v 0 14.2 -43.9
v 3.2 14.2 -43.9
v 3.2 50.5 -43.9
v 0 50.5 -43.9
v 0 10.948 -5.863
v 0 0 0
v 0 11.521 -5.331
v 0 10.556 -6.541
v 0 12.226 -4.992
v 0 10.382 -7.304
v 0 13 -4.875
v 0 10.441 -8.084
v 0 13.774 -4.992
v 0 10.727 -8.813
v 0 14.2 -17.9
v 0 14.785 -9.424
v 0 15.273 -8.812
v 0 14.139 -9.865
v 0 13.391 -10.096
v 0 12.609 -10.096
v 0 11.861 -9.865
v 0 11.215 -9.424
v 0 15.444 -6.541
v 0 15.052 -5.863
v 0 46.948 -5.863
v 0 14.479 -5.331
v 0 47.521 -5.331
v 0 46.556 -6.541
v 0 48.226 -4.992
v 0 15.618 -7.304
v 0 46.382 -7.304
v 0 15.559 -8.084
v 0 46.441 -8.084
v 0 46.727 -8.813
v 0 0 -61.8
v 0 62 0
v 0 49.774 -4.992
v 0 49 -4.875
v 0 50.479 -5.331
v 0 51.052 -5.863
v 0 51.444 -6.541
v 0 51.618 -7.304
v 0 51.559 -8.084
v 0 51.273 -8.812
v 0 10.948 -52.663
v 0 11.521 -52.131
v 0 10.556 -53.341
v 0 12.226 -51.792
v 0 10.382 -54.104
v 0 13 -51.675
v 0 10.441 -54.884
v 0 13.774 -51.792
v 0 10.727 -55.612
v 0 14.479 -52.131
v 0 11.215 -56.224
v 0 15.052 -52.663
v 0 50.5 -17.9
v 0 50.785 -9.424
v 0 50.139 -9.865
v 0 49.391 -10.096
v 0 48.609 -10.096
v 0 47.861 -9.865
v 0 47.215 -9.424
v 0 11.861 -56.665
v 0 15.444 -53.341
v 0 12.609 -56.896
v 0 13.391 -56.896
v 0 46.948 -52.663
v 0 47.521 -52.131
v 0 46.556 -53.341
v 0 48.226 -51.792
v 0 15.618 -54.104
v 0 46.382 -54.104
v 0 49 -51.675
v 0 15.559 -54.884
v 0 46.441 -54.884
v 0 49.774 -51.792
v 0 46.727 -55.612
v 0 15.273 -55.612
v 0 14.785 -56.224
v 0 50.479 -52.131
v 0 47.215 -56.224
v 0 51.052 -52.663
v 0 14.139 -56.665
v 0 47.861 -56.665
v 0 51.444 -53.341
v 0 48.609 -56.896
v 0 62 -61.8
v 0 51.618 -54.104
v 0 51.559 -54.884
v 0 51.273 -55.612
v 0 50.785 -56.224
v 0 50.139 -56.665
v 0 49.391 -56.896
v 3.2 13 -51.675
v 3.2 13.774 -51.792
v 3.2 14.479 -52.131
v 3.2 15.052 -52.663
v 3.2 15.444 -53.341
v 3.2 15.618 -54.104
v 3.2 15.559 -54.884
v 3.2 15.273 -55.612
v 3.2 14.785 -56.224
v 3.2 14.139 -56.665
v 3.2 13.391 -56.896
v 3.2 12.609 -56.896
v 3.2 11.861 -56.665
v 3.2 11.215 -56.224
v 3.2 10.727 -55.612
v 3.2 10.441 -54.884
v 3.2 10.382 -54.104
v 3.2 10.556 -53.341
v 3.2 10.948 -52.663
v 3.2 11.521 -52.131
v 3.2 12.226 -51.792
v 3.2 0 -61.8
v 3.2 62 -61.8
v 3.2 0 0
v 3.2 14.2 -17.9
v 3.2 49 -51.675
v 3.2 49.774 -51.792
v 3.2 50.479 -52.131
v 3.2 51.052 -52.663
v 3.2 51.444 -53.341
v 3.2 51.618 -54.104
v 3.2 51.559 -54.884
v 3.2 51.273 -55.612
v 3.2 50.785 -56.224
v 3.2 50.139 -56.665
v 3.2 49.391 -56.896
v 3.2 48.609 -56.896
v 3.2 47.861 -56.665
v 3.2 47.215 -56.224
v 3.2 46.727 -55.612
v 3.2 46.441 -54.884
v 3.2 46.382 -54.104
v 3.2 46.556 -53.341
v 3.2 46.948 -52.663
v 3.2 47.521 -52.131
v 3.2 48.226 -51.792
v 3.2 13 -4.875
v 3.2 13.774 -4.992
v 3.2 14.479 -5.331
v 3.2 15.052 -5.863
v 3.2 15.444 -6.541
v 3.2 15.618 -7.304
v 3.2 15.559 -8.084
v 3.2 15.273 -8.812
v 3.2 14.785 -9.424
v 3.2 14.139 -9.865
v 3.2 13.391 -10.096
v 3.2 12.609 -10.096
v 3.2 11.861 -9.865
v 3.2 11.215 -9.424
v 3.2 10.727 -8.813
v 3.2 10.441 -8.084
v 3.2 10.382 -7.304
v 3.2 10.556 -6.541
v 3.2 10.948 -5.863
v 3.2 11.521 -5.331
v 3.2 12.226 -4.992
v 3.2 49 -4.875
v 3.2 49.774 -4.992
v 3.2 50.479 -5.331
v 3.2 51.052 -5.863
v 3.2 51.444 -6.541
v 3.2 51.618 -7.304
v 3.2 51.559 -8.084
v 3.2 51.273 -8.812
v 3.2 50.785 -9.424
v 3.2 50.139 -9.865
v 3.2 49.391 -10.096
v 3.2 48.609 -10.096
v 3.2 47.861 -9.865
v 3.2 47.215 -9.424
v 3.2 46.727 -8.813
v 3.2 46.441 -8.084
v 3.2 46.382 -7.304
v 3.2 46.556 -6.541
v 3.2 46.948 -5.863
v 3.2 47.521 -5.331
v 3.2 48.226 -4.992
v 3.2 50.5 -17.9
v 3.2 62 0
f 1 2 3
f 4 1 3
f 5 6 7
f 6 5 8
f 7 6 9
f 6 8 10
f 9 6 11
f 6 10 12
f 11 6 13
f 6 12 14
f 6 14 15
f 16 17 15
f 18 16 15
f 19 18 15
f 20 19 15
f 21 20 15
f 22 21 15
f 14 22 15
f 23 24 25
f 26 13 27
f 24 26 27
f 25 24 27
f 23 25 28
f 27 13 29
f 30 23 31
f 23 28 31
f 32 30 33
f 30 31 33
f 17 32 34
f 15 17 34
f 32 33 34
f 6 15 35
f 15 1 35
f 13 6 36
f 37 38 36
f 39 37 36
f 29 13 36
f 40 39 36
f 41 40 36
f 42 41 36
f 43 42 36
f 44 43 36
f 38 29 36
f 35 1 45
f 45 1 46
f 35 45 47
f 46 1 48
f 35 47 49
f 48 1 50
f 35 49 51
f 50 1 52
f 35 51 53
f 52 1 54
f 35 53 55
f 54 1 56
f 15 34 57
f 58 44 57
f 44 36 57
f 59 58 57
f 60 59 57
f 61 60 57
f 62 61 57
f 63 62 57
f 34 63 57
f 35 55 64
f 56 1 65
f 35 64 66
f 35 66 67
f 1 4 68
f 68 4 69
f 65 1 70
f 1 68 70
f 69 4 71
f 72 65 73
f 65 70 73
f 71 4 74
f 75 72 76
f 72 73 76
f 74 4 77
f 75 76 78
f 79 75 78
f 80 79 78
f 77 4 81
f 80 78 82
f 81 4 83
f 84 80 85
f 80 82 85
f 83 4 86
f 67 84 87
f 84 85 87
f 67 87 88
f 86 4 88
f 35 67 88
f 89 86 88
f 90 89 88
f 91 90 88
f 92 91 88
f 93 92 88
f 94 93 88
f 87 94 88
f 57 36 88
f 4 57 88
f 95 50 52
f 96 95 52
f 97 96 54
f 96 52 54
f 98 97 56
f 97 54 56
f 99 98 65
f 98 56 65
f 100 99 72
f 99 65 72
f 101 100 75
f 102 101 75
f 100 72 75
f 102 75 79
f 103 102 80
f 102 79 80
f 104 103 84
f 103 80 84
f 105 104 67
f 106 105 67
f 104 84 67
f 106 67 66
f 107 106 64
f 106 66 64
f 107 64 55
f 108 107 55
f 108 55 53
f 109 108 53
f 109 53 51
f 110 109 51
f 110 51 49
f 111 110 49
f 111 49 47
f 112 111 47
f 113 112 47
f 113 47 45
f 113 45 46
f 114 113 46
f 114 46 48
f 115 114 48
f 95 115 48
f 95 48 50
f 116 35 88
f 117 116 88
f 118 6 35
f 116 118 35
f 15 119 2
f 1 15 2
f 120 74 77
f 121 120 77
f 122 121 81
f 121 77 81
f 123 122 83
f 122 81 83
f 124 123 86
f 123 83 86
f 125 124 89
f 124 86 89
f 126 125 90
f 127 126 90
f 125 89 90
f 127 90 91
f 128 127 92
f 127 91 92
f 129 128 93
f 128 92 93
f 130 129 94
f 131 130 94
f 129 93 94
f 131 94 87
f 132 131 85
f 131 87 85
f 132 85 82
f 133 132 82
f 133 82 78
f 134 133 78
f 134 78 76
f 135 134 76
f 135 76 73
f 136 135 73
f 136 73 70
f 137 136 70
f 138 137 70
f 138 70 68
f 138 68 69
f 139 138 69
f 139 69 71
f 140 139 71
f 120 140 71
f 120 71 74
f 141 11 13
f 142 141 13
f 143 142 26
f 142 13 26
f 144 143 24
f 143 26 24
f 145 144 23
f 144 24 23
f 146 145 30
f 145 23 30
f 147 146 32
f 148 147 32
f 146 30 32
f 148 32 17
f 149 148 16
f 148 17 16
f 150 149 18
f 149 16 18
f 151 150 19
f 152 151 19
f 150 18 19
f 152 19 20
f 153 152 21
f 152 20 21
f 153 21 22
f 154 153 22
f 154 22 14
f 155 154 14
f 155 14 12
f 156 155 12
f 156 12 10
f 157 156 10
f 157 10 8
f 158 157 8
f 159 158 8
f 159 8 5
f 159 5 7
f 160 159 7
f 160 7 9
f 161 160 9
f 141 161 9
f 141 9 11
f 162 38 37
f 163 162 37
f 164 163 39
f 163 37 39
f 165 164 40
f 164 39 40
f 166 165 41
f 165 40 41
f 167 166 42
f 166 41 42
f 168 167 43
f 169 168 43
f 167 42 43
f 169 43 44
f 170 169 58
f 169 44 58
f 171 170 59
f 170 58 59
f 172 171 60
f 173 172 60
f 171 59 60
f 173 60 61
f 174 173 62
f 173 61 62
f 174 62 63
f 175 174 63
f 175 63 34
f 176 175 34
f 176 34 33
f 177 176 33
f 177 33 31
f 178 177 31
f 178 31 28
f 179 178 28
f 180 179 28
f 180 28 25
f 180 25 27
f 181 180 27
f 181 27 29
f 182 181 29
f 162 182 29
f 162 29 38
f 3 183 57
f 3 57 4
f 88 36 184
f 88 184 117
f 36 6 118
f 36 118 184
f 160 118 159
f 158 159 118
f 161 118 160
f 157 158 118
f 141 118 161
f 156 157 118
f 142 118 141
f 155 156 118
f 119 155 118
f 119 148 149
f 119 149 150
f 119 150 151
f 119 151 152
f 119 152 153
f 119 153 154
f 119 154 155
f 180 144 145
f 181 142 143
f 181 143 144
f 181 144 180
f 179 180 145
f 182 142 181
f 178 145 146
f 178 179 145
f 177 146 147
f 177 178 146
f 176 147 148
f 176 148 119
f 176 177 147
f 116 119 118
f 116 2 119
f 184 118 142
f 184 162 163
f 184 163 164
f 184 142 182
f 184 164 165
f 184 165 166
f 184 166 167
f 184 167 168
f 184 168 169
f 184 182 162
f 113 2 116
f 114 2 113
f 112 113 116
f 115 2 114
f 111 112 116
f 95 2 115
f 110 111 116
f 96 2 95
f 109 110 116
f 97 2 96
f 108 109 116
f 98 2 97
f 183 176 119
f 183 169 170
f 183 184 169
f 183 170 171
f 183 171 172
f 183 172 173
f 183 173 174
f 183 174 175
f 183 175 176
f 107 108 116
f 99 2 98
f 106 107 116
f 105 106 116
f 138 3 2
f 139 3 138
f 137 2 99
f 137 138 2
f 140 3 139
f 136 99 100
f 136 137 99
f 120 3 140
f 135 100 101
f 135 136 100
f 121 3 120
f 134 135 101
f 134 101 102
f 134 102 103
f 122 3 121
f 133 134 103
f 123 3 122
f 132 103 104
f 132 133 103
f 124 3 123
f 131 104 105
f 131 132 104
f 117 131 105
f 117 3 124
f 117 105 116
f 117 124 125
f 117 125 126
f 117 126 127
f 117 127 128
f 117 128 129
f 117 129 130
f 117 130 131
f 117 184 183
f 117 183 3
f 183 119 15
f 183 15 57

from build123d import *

# Parameters (mm, degrees)
SKETCH1_W           = 61.8
SKETCH1_H           = 62
BOSS_EXTRUDE1_DEPTH = 3.2
CUT_EXTRUDE1_REACH  = 5.2
SKETCH2_W           = 26
SKETCH2_H           = 36.3
CUT_EXTRUDE2_REACH  = 5.2
SKETCH3_R           = 2.625


with BuildPart() as part:
    # Sketch1 → Boss-Extrude1 (new body)
    with BuildSketch(Plane(origin=(0, 0, 0), x_dir=(0, 0, -1), z_dir=(1, 0, 0))):
        with Locations((30.9, 31)):
            Rectangle(SKETCH1_W, SKETCH1_H)
    extrude(amount=BOSS_EXTRUDE1_DEPTH)

    # Sketch2 → Cut-Extrude1 (cut, up to next)
    with BuildSketch(Plane(origin=(3.2, 0, 0), x_dir=(0, 0, -1), z_dir=(1, 0, 0)), mode=Mode.PRIVATE) as cut_extrude1_sk1:
        with Locations((30.9, 32.35)):
            Rectangle(SKETCH2_W, SKETCH2_H)
    cut_extrude1_tool1 = extrude(cut_extrude1_sk1.sketch, amount=-CUT_EXTRUDE1_REACH, mode=Mode.PRIVATE) & part.part
    add(cut_extrude1_tool1.solids().sort_by_distance((3.2, 32.35, -30.9))[0], mode=Mode.SUBTRACT)

    # Sketch3 → Cut-Extrude2 (cut, up to next)
    with BuildSketch(Plane.ZY, mode=Mode.PRIVATE) as cut_extrude2_sk1:
        with Locations((-7.5, 49)):
            Circle(SKETCH3_R)
    cut_extrude2_tool1 = extrude(cut_extrude2_sk1.sketch, amount=-CUT_EXTRUDE2_REACH, mode=Mode.PRIVATE) & part.part
    add(cut_extrude2_tool1.solids().sort_by_distance((0, 49, -7.5))[0], mode=Mode.SUBTRACT)
    # Sketch3 → Cut-Extrude2 (cut, up to next)
    with BuildSketch(Plane.ZY, mode=Mode.PRIVATE) as cut_extrude2_sk2:
        with Locations((-7.5, 13)):
            Circle(SKETCH3_R)
    cut_extrude2_tool2 = extrude(cut_extrude2_sk2.sketch, amount=-CUT_EXTRUDE2_REACH, mode=Mode.PRIVATE) & part.part
    add(cut_extrude2_tool2.solids().sort_by_distance((0, 13, -7.5))[0], mode=Mode.SUBTRACT)
    # Sketch3 → Cut-Extrude2 (cut, up to next)
    with BuildSketch(Plane.ZY, mode=Mode.PRIVATE) as cut_extrude2_sk3:
        with Locations((-54.3, 49)):
            Circle(SKETCH3_R)
    cut_extrude2_tool3 = extrude(cut_extrude2_sk3.sketch, amount=-CUT_EXTRUDE2_REACH, mode=Mode.PRIVATE) & part.part
    add(cut_extrude2_tool3.solids().sort_by_distance((0, 49, -54.3))[0], mode=Mode.SUBTRACT)
    # Sketch3 → Cut-Extrude2 (cut, up to next)
    with BuildSketch(Plane.ZY, mode=Mode.PRIVATE) as cut_extrude2_sk4:
        with Locations((-54.3, 13)):
            Circle(SKETCH3_R)
    cut_extrude2_tool4 = extrude(cut_extrude2_sk4.sketch, amount=-CUT_EXTRUDE2_REACH, mode=Mode.PRIVATE) & part.part
    add(cut_extrude2_tool4.solids().sort_by_distance((0, 13, -54.3))[0], mode=Mode.SUBTRACT)


solid = part.part
